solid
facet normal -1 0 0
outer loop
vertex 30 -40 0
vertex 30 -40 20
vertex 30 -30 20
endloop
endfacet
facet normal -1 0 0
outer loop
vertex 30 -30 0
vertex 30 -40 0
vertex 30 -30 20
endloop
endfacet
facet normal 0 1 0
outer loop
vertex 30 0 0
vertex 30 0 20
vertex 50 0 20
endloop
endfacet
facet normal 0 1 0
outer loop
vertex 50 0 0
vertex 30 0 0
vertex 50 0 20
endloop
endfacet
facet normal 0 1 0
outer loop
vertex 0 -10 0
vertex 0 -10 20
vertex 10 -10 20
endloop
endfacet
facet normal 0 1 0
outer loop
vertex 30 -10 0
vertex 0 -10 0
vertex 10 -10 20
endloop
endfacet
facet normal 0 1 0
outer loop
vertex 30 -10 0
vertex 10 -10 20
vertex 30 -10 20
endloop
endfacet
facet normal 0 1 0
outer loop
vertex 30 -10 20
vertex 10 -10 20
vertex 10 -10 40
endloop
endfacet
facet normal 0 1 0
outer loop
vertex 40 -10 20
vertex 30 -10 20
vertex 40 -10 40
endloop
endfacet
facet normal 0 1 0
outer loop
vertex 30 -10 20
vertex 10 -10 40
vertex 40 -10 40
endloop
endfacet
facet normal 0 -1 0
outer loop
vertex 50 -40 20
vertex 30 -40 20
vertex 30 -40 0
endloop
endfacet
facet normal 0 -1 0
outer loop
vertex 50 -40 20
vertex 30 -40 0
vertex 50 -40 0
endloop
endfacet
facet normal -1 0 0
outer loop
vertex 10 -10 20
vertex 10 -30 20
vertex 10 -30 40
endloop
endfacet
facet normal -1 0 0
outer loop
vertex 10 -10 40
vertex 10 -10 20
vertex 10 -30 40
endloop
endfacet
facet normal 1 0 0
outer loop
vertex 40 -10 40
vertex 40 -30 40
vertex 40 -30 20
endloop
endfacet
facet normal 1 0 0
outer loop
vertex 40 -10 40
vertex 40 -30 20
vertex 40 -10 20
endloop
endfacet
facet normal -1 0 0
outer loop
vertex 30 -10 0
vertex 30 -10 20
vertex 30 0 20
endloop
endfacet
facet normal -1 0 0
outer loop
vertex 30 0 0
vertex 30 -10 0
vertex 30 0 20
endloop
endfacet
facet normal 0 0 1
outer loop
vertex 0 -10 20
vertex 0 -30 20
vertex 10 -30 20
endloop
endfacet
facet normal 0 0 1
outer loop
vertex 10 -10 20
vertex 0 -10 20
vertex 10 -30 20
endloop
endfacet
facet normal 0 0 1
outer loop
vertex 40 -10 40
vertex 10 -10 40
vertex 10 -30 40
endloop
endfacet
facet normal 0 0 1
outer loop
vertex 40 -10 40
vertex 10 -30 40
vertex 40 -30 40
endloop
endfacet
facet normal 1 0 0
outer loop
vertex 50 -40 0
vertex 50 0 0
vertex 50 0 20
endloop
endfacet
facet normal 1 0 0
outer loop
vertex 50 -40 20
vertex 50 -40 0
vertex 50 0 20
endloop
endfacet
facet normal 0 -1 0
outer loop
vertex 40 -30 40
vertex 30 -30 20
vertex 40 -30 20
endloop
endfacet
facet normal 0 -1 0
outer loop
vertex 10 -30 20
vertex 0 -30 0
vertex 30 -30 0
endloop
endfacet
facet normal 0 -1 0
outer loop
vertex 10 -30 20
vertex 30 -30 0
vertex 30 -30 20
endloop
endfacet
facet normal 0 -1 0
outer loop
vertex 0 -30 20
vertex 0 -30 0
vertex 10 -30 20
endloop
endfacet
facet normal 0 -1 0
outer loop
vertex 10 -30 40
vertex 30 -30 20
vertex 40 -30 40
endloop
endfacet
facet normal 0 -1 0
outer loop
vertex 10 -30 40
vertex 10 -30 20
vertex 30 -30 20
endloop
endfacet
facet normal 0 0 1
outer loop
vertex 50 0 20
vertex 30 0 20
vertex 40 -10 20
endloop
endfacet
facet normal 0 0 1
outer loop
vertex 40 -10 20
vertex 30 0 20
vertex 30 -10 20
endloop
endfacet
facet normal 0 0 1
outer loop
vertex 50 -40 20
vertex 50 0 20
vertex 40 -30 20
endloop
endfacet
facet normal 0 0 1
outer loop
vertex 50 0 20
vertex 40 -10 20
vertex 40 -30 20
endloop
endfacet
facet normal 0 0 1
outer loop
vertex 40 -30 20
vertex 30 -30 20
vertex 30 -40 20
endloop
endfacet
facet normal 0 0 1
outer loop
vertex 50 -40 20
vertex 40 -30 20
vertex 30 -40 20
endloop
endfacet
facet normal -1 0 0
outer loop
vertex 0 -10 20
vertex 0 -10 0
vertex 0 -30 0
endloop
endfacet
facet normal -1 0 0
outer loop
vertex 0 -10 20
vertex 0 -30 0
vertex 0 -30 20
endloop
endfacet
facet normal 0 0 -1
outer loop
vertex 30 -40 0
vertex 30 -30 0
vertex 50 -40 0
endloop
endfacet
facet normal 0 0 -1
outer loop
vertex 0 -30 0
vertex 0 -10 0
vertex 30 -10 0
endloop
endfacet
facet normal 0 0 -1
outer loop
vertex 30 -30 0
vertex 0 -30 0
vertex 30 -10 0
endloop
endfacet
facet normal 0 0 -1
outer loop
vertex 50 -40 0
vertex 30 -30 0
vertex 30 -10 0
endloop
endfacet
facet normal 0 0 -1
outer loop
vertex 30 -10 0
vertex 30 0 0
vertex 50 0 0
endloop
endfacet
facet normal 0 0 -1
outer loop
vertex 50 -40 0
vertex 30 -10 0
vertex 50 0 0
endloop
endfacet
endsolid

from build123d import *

# Parameters (mm, degrees)
F0_W     = 50
F0_H     = 40
F1_DEPTH = 40
F2_W     = 10
F2_H     = 20
F3_DEPTH = 50.001
F4_W     = 30
F4_H     = 10
F5_DEPTH = 20.001
F6_W     = 10
F6_H     = 20
F7_DEPTH = 20
F8_W     = 10
F8_H     = 20
F9_DEPTH = 30.001


with BuildPart() as f1:
    # F0 (on Front) → F1 (new body)
    with BuildSketch(Plane.XZ):
        with Locations((25, 20)):
            Rectangle(F0_W, F0_H)
    extrude(amount=F1_DEPTH)

    # F2 (on face) → F3 (cut, through all)
    with BuildSketch(Plane(origin=(0, 0, 0), x_dir=(0, -1, 0), z_dir=(-1, 0, 0))):
        with Locations((5, 30)):
            Rectangle(F2_W, F2_H)
        with Locations((35, 30)):
            Rectangle(F2_W, F2_H)
    extrude(amount=-F3_DEPTH, mode=Mode.SUBTRACT)

    # F4 (on face) → F5 (cut, through all)
    with BuildSketch(Plane.XY.offset(20)):
        with Locations((15, -5)):
            Rectangle(F4_W, F4_H)
        with Locations((15, -35)):
            Rectangle(F4_W, F4_H)
    extrude(amount=-F5_DEPTH, mode=Mode.SUBTRACT)

    # F6 (on face) → F7 (cut, through all)
    with BuildSketch(Plane.XY.offset(40)):
        with Locations((45, -20)):
            Rectangle(F6_W, F6_H)
    extrude(amount=-F7_DEPTH, mode=Mode.SUBTRACT)

    # F8 (on face) → F9 (cut, through all)
    with BuildSketch(Plane.XZ.offset(30)):
        with Locations((5, 30)):
            Rectangle(F8_W, F8_H)
    extrude(amount=-F9_DEPTH, mode=Mode.SUBTRACT)


solid = f1.part
